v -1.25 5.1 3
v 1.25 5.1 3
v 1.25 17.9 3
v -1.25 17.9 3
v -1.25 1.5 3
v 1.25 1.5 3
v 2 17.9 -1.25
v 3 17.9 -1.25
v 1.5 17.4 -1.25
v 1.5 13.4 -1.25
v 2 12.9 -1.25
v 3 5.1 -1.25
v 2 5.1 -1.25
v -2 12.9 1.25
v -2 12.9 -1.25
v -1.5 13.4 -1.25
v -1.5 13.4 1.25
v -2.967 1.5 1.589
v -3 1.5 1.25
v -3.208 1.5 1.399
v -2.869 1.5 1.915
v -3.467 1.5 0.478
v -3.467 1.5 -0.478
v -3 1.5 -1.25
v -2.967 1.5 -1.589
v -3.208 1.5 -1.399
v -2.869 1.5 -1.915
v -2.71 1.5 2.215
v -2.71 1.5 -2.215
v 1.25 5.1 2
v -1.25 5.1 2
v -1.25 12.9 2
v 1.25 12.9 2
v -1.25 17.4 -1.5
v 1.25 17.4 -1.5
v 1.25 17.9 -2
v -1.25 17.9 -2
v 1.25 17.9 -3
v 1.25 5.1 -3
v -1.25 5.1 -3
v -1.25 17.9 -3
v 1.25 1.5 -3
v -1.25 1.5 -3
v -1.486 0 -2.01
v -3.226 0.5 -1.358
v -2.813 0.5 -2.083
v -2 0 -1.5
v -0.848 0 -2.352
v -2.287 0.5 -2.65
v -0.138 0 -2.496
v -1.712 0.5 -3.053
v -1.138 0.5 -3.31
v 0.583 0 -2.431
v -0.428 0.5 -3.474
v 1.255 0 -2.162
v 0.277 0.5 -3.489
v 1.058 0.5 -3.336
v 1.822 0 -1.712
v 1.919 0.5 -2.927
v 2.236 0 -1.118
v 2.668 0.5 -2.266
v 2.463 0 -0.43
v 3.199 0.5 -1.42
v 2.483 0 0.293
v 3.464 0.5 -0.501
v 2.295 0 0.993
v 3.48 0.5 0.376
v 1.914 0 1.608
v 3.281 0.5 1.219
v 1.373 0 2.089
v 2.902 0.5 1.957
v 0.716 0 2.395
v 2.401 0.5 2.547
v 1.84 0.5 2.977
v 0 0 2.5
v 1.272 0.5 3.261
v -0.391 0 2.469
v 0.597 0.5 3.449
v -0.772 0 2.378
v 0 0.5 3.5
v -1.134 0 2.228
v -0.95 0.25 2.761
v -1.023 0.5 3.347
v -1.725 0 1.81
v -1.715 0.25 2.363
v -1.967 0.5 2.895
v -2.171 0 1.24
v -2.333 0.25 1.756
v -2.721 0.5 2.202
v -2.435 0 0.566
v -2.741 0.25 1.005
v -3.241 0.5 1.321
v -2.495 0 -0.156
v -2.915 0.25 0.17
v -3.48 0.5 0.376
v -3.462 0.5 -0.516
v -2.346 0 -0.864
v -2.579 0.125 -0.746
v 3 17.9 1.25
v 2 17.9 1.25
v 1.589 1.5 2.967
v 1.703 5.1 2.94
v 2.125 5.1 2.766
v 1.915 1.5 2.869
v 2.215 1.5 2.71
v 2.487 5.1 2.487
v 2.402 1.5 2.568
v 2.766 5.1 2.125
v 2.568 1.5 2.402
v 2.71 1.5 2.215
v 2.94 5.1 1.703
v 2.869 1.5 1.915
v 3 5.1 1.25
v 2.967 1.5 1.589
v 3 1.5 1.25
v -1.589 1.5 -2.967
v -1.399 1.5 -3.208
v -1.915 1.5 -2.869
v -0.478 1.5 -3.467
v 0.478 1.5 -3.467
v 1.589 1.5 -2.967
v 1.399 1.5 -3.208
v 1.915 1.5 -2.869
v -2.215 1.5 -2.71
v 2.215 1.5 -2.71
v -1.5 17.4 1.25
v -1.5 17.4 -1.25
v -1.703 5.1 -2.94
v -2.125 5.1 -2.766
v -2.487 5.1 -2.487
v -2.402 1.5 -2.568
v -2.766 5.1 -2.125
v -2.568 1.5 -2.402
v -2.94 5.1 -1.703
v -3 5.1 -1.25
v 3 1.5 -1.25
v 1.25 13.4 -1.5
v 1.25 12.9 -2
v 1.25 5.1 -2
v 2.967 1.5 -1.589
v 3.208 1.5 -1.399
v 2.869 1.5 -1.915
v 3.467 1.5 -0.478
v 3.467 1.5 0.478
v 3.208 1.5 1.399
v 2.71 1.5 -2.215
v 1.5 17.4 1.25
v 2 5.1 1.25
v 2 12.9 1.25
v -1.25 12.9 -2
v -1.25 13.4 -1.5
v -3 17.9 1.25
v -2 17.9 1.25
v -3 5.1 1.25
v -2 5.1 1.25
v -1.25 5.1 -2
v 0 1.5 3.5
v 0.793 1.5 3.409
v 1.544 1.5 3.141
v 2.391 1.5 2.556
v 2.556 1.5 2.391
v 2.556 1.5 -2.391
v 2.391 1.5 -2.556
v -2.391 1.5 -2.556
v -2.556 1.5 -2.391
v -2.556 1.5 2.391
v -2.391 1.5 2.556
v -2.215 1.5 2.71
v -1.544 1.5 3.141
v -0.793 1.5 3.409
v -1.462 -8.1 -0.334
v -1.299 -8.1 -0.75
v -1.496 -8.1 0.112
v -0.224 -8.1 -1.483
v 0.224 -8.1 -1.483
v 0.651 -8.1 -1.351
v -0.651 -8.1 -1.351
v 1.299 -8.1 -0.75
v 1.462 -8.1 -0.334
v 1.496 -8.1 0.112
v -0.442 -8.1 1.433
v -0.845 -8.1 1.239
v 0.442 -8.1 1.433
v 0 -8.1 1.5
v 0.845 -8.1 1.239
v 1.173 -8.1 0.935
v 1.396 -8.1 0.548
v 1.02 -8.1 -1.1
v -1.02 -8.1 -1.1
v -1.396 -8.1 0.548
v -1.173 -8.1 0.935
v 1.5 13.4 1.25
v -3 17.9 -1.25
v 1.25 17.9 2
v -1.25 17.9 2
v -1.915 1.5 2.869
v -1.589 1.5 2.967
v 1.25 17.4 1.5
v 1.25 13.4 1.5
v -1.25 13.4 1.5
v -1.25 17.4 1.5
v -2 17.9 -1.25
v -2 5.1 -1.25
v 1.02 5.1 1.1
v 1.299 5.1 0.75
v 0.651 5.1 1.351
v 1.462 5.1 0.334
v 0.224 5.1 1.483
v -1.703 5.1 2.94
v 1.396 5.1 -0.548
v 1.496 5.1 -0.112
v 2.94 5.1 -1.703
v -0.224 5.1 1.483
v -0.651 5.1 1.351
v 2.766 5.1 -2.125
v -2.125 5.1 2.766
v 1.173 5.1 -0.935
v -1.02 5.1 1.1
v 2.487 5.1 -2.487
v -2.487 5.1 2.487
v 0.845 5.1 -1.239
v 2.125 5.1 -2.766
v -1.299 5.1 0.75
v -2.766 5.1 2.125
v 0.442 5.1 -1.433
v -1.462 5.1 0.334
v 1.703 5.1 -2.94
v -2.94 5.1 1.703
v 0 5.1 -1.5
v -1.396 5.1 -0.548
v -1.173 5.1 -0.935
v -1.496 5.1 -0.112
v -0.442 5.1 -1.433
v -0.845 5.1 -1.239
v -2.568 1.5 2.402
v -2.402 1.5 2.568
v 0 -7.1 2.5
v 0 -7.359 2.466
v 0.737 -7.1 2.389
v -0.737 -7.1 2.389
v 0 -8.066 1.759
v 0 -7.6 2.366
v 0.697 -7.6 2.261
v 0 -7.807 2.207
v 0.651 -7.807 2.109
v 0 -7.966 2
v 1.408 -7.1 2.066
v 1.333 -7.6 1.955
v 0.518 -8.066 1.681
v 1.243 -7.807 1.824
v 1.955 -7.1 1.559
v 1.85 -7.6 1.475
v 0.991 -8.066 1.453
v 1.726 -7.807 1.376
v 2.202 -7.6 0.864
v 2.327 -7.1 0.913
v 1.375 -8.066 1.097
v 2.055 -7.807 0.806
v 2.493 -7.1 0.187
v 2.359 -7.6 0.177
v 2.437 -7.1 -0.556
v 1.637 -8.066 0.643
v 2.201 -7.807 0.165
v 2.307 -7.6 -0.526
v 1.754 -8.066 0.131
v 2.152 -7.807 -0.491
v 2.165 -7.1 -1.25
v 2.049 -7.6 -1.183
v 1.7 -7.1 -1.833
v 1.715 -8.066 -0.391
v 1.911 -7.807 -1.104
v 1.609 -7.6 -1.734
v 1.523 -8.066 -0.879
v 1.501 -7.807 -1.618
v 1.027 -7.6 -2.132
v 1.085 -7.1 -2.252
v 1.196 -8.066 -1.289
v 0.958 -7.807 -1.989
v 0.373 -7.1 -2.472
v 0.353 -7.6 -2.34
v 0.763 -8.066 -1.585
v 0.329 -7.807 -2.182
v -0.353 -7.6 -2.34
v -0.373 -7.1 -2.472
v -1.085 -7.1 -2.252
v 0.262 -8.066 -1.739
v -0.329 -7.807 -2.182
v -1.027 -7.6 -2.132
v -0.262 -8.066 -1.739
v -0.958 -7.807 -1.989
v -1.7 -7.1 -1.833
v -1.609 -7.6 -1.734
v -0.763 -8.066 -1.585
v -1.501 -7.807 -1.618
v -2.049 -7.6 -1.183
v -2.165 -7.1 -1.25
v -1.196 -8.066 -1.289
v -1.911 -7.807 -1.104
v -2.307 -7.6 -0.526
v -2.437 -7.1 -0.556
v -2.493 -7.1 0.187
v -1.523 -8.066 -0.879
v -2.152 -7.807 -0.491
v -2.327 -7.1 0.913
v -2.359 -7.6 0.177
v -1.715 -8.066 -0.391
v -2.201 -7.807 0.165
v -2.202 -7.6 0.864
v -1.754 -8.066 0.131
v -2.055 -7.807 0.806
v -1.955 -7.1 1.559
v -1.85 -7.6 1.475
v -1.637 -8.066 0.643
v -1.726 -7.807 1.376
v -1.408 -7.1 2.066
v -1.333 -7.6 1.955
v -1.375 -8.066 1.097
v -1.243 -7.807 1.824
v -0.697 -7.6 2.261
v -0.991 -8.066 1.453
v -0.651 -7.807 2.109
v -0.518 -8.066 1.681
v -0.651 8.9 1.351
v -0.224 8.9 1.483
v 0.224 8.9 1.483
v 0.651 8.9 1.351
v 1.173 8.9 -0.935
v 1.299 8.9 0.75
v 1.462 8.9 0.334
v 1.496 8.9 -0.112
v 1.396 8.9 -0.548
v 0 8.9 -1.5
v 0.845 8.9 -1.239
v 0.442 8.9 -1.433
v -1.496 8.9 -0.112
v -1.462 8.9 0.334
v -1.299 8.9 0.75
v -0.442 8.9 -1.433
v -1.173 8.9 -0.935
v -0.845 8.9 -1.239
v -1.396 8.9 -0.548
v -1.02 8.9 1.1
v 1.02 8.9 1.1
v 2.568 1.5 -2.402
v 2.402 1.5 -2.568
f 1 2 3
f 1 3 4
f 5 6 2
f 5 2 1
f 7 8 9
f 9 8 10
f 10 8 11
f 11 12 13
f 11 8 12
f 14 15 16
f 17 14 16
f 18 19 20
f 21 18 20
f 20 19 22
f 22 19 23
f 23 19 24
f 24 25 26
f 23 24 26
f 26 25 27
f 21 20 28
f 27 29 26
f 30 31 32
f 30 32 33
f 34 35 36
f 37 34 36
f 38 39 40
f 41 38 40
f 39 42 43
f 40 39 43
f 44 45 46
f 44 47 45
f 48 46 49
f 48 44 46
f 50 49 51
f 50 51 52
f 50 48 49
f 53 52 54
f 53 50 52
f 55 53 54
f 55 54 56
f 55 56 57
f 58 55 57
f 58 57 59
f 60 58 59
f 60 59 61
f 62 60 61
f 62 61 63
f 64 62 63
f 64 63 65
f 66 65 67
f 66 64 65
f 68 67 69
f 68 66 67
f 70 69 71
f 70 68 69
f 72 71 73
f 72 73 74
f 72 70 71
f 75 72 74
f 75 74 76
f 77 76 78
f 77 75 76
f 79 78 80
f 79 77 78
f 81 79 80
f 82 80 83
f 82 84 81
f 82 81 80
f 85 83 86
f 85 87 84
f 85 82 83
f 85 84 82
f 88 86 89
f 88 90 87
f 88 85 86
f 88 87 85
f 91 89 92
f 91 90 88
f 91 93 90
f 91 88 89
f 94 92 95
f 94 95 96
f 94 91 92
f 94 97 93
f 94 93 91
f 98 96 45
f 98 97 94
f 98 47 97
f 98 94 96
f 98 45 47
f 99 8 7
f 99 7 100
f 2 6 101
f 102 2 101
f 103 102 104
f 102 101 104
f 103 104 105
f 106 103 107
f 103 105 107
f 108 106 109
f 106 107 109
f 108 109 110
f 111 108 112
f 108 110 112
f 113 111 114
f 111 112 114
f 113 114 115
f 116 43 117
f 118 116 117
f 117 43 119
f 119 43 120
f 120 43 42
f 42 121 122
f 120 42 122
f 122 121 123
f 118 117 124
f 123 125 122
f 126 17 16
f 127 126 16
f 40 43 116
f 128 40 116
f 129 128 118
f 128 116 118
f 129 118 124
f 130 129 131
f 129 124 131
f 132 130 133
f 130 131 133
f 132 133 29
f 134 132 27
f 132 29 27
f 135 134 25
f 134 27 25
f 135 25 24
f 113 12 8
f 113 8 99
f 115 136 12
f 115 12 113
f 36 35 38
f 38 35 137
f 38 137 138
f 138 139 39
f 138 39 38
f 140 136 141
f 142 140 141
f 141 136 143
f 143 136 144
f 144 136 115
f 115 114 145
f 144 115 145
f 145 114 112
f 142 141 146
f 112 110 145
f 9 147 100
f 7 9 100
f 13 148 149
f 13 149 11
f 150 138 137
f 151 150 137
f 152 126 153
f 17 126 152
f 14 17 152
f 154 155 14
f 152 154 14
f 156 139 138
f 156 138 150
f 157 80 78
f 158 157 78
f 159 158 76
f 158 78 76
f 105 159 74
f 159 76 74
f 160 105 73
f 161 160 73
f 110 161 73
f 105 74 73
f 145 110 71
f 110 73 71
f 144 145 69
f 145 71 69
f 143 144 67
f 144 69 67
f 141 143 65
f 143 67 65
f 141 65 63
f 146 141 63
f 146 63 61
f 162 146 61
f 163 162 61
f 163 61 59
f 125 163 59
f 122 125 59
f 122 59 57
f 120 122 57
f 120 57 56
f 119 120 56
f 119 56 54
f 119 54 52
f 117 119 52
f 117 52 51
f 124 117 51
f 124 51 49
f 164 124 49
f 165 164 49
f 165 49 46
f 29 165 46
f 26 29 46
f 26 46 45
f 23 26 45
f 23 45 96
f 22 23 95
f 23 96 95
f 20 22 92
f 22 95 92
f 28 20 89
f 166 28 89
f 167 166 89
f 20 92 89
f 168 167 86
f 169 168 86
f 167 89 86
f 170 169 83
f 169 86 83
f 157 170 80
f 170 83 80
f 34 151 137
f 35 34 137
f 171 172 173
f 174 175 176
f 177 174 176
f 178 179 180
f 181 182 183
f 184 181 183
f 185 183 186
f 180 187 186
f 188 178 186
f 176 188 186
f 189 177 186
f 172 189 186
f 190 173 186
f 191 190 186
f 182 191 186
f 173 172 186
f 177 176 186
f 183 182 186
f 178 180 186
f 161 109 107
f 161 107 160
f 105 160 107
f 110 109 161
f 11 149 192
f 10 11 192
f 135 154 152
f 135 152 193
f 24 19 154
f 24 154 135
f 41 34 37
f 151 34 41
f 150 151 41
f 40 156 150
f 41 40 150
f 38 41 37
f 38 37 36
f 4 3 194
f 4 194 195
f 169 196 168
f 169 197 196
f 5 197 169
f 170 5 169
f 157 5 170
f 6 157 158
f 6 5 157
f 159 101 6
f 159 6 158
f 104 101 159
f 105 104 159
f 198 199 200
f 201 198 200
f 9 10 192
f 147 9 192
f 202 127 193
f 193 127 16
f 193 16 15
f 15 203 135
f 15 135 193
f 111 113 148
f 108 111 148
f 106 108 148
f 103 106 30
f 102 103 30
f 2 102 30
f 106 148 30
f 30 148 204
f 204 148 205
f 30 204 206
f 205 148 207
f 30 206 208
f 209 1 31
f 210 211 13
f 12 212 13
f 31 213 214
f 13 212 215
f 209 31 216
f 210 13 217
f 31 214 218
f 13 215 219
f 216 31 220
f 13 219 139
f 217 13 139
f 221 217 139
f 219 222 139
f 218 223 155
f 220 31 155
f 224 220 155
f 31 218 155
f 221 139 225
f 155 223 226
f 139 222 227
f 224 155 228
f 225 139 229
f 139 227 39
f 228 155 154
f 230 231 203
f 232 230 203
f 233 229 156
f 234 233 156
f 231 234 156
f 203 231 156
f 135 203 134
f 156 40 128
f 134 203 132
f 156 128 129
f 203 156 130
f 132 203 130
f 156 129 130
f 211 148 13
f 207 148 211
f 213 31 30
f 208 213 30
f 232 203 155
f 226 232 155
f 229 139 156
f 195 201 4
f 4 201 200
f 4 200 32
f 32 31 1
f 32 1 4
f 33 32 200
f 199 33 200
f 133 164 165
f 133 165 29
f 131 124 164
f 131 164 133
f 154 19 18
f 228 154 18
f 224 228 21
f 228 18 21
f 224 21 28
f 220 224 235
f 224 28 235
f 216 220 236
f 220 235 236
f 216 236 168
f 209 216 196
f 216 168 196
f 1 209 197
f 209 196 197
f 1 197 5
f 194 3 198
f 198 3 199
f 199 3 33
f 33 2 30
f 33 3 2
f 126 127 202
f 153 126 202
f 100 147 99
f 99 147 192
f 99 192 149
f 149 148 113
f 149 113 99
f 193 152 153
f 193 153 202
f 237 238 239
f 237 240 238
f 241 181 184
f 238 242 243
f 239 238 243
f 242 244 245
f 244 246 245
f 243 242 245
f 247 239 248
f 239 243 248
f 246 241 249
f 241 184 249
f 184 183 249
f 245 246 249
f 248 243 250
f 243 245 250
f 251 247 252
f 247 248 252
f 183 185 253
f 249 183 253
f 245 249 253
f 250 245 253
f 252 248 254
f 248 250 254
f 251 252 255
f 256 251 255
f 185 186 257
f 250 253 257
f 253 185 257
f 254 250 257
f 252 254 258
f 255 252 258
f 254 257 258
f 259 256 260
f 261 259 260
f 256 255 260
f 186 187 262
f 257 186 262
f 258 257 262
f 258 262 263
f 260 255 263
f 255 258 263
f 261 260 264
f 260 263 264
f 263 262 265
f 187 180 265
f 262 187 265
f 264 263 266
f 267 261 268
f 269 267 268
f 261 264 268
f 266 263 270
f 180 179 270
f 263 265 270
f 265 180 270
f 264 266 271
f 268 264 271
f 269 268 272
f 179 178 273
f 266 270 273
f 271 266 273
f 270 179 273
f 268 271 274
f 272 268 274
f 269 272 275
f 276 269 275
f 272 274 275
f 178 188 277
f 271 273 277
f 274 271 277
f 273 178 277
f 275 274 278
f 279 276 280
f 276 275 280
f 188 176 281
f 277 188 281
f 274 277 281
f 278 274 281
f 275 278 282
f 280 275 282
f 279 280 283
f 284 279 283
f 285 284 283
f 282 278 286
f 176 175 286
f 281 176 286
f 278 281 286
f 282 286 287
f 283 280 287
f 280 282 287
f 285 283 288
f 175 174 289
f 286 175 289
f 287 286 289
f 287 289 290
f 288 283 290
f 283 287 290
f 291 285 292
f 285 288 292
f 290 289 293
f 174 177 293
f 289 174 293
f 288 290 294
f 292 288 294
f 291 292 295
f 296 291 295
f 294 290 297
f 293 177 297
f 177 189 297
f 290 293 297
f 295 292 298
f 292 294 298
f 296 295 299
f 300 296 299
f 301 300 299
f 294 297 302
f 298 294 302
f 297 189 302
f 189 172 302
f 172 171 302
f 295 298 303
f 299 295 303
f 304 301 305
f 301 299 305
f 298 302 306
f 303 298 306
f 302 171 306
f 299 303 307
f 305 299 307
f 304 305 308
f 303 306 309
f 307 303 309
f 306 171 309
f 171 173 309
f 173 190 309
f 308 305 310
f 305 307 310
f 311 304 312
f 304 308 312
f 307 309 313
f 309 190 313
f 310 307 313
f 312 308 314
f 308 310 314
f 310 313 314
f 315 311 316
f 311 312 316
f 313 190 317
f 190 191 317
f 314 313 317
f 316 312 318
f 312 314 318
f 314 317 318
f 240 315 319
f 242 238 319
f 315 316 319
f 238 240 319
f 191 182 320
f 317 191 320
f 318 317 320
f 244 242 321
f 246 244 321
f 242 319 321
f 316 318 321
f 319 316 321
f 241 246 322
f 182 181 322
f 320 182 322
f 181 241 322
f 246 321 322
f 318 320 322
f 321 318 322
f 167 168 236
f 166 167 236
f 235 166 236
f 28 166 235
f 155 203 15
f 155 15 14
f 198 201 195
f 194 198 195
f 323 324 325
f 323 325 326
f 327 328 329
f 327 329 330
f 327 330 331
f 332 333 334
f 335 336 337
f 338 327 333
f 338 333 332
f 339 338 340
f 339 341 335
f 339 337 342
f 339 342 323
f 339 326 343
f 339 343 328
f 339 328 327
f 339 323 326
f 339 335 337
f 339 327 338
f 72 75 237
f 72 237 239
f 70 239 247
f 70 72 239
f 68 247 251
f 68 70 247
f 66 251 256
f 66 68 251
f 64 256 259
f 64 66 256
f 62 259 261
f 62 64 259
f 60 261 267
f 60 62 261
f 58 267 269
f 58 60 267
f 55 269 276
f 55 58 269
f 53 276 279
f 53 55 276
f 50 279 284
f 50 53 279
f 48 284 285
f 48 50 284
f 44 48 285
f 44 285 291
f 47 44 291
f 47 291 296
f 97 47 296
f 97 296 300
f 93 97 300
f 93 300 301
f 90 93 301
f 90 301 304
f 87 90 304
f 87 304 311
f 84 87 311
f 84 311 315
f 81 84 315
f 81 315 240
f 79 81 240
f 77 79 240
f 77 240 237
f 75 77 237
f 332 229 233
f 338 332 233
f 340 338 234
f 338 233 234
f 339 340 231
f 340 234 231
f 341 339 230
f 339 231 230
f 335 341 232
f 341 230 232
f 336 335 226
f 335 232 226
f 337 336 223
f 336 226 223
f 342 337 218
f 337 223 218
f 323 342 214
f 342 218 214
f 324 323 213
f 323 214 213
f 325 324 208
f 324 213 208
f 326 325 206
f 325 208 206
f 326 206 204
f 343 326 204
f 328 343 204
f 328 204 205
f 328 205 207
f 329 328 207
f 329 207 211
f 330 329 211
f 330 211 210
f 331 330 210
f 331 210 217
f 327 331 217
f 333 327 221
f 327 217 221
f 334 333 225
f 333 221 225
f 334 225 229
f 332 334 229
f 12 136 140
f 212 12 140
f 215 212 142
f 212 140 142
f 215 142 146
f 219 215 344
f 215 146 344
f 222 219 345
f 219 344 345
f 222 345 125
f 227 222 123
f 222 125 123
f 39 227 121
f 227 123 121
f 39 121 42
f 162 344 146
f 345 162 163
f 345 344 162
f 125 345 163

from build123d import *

# Parameters (mm, degrees)
SKETCH_1_R               = 2.5
EXTRUDE_1_DEPTH          = 8.1
SKETCH_4_R               = 3.5
EXTRUDE_2_DEPTH          = 1
EXTRUDE_3_DEPTH          = 11.4
SKETCH_6_W               = 2.5
SKETCH_6_H               = 1.5
EXTRUDE_4_DEPTH          = 5
CUT_EXTRUDE_2_DEPTH      = 2.5
CUT_EXTRUDE_3_DEPTH      = 2.5
PATTERN_CIRCULAR_4_COUNT = 4
EXTRUDE_6_DEPTH          = 3.6
SKETCH_15_R              = 1.5
EXTRUDE_7_DEPTH          = 3.8
FILLET_2_R               = 1
FILLET_3_R               = 1.75


with BuildPart() as part:
    # Эскиз1 → Бобышка-Вытянуть1 (new body)
    with BuildSketch(Plane(origin=(0, 0, 0), x_dir=(1, 0, 0), z_dir=(0, 1, 0))):
        with Locations(Location((0, 0, 0), (0, 0, 270))):
            Circle(SKETCH_1_R)
    extrude(amount=-EXTRUDE_1_DEPTH)

    # По сечениям1: read off the stored shape, not the designer's step
    # По сечениям1: loft between two sections, ruled curve by curve
    loft_1_from = [
        Edge.make_bspline([(0, 0.5, 3.5), (-7, 0.5, 3.5), (-7, 0.5, -3.5), (0, 0.5, -3.5), (7, 0.5, -3.5), (7, 0.5, 3.5), (0, 0.5, 3.5)], [0, 0, 0, 0, 0.5, 0.5, 0.5, 1, 1, 1, 1], 3, [1, 0.333333333, 0.333333333, 1, 0.333333333, 0.333333333, 1]),
    ]
    loft_1_to = [
        Edge.make_bspline([(-1.133576436, 0, 2.228228997), (-5.59003443, 0, -0.038923874), (-3.322881559, 0, -4.495381869), (1.133576436, 0, -2.228228997), (5.59003443, 0, 0.038923874), (3.322881559, 0, 4.495381869), (-1.133576436, 0, 2.228228997)], [0, 0, 0, 0, 0.5, 0.5, 0.5, 1, 1, 1, 1], 3, [1, 0.333333333, 0.333333333, 1, 0.333333333, 0.333333333, 1]),
    ]
    loft_1 = Solid(Shell([*[Face.make_surface_from_curves(loft_1_from[k], loft_1_to[k]) for k in range(1)], Face(Wire(loft_1_from)), Face(Wire(loft_1_to))]))
    add(loft_1)

    # Эскиз4 → Бобышка-Вытянуть2 (add)
    with BuildSketch(Plane(origin=(0, 0.5, 0), x_dir=(1, 0, 0), z_dir=(0, 1, 0))):
        with Locations(Location((0, 0, 0), (0, 0, 270))):
            Circle(SKETCH_4_R)
    extrude(amount=EXTRUDE_2_DEPTH)

    # Эскиз5 → Бобышка-Вытянуть3 (add)
    with BuildSketch(Plane(origin=(0, 1.5, 0), x_dir=(1, 0, 0), z_dir=(0, 1, 0))):
        Polygon((1.25, 2.5), (1.25, 2), (-1.25, 2), (-1.25, 2.5), (-1.25, 3), (1.25, 3), align=None)
    extrude_3 = extrude(amount=EXTRUDE_3_DEPTH)

    # Эскиз6 → Бобышка-Вытянуть4 (add)
    with BuildSketch(Plane(origin=(0, 12.9, 0), x_dir=(1, 0, 0), z_dir=(0, 1, 0))):
        with Locations((0, 2.25)):
            Rectangle(SKETCH_6_W, SKETCH_6_H)
    extrude_4 = extrude(amount=EXTRUDE_4_DEPTH)

    # Эскиз8 → Вырез-Вытянуть2 (cut)
    with BuildSketch(Plane(origin=(1.25, 0, 0), x_dir=(0, 0, -1), z_dir=(1, 0, 0))):
        Polygon((1.5, 12.9), (2, 12.9), (1.5, 13.4), align=None)
    cut_extrude_2 = extrude(amount=-CUT_EXTRUDE_2_DEPTH, mode=Mode.SUBTRACT)

    # Эскиз9 → Вырез-Вытянуть3 (cut)
    with BuildSketch(Plane(origin=(1.25, 0, 0), x_dir=(0, 0, -1), z_dir=(1, 0, 0))):
        Polygon((1.5, 17.9), (1.5, 17.4), (2, 17.9), align=None)
    cut_extrude_3 = extrude(amount=-CUT_EXTRUDE_3_DEPTH, mode=Mode.SUBTRACT)

    # Круговой массив4: Бобышка-Вытянуть3, Бобышка-Вытянуть4, Вырез-Вытянуть2, Вырез-Вытянуть3 ×4 about axis
    pattern_circular_4_axis = Axis((0, 0, 0), (0, 1, 0))
    add([extrude_3.rotate(pattern_circular_4_axis, i * 360 / PATTERN_CIRCULAR_4_COUNT) for i in range(1, PATTERN_CIRCULAR_4_COUNT)])
    add([extrude_4.rotate(pattern_circular_4_axis, i * 360 / PATTERN_CIRCULAR_4_COUNT) for i in range(1, PATTERN_CIRCULAR_4_COUNT)])
    add([cut_extrude_2.rotate(pattern_circular_4_axis, i * 360 / PATTERN_CIRCULAR_4_COUNT) for i in range(1, PATTERN_CIRCULAR_4_COUNT)], mode=Mode.SUBTRACT)
    add([cut_extrude_3.rotate(pattern_circular_4_axis, i * 360 / PATTERN_CIRCULAR_4_COUNT) for i in range(1, PATTERN_CIRCULAR_4_COUNT)], mode=Mode.SUBTRACT)

    # Эскиз14 → Бобышка-Вытянуть6 (add)
    with BuildSketch(Plane(origin=(0, 1.5, 0), x_dir=(1, 0, 0), z_dir=(0, 1, 0))):
        Polygon((0, 3), (3, 3), (3, -3), (-3, -3), (-3, 3), align=None)
    extrude(amount=EXTRUDE_6_DEPTH)

    # Эскиз15 → Бобышка-Вытянуть7 (add)
    with BuildSketch(Plane(origin=(0, 5.1, 0), x_dir=(1, 0, 0), z_dir=(0, 1, 0))):
        with Locations(Location((0, 0, 0), (0, 0, 90))):
            Circle(SKETCH_15_R)
    extrude(amount=EXTRUDE_7_DEPTH)

    # Скругление2
    fillet_2_edges = [part.edges().sort_by_distance(p)[0] for p in [
        (0, -8.1, -2.5),
    ]]
    fillet(fillet_2_edges, radius=FILLET_2_R)

    # Скругление3
    # the kernel refuses this fillet: 1.75 mm, written as the material it takes off along each edge
    with BuildSketch(Plane(origin=(-3, 1.5, -3), x_dir=(0, 0, 1), z_dir=(0, 1, 0)), Plane(origin=(3, 1.5, -3), x_dir=(-1, 0, 0), z_dir=(0, 1, 0)), Plane(origin=(-3, 1.5, 3), x_dir=(1, 0, 0), z_dir=(0, 1, 0))) as fillet_3_piece_1:
        with BuildLine():
            CenterArc((FILLET_3_R, FILLET_3_R), FILLET_3_R, 180, 90)
            Line((0, FILLET_3_R), (0, 0))
            Line((0, 0), (FILLET_3_R, 0))
        make_face()
    extrude(amount=7.975, mode=Mode.SUBTRACT)
    with BuildSketch(Plane(origin=(3, 1.5, 3), x_dir=(-1, 0, 0), z_dir=(0, 1, 0))) as fillet_3_piece_2:
        with BuildLine():
            CenterArc((FILLET_3_R, -FILLET_3_R), FILLET_3_R, 90, 90)
            Line((0, -FILLET_3_R), (0, 0))
            Line((0, 0), (FILLET_3_R, 0))
        make_face()
    extrude(amount=7.975, mode=Mode.SUBTRACT)


solid = part.part
